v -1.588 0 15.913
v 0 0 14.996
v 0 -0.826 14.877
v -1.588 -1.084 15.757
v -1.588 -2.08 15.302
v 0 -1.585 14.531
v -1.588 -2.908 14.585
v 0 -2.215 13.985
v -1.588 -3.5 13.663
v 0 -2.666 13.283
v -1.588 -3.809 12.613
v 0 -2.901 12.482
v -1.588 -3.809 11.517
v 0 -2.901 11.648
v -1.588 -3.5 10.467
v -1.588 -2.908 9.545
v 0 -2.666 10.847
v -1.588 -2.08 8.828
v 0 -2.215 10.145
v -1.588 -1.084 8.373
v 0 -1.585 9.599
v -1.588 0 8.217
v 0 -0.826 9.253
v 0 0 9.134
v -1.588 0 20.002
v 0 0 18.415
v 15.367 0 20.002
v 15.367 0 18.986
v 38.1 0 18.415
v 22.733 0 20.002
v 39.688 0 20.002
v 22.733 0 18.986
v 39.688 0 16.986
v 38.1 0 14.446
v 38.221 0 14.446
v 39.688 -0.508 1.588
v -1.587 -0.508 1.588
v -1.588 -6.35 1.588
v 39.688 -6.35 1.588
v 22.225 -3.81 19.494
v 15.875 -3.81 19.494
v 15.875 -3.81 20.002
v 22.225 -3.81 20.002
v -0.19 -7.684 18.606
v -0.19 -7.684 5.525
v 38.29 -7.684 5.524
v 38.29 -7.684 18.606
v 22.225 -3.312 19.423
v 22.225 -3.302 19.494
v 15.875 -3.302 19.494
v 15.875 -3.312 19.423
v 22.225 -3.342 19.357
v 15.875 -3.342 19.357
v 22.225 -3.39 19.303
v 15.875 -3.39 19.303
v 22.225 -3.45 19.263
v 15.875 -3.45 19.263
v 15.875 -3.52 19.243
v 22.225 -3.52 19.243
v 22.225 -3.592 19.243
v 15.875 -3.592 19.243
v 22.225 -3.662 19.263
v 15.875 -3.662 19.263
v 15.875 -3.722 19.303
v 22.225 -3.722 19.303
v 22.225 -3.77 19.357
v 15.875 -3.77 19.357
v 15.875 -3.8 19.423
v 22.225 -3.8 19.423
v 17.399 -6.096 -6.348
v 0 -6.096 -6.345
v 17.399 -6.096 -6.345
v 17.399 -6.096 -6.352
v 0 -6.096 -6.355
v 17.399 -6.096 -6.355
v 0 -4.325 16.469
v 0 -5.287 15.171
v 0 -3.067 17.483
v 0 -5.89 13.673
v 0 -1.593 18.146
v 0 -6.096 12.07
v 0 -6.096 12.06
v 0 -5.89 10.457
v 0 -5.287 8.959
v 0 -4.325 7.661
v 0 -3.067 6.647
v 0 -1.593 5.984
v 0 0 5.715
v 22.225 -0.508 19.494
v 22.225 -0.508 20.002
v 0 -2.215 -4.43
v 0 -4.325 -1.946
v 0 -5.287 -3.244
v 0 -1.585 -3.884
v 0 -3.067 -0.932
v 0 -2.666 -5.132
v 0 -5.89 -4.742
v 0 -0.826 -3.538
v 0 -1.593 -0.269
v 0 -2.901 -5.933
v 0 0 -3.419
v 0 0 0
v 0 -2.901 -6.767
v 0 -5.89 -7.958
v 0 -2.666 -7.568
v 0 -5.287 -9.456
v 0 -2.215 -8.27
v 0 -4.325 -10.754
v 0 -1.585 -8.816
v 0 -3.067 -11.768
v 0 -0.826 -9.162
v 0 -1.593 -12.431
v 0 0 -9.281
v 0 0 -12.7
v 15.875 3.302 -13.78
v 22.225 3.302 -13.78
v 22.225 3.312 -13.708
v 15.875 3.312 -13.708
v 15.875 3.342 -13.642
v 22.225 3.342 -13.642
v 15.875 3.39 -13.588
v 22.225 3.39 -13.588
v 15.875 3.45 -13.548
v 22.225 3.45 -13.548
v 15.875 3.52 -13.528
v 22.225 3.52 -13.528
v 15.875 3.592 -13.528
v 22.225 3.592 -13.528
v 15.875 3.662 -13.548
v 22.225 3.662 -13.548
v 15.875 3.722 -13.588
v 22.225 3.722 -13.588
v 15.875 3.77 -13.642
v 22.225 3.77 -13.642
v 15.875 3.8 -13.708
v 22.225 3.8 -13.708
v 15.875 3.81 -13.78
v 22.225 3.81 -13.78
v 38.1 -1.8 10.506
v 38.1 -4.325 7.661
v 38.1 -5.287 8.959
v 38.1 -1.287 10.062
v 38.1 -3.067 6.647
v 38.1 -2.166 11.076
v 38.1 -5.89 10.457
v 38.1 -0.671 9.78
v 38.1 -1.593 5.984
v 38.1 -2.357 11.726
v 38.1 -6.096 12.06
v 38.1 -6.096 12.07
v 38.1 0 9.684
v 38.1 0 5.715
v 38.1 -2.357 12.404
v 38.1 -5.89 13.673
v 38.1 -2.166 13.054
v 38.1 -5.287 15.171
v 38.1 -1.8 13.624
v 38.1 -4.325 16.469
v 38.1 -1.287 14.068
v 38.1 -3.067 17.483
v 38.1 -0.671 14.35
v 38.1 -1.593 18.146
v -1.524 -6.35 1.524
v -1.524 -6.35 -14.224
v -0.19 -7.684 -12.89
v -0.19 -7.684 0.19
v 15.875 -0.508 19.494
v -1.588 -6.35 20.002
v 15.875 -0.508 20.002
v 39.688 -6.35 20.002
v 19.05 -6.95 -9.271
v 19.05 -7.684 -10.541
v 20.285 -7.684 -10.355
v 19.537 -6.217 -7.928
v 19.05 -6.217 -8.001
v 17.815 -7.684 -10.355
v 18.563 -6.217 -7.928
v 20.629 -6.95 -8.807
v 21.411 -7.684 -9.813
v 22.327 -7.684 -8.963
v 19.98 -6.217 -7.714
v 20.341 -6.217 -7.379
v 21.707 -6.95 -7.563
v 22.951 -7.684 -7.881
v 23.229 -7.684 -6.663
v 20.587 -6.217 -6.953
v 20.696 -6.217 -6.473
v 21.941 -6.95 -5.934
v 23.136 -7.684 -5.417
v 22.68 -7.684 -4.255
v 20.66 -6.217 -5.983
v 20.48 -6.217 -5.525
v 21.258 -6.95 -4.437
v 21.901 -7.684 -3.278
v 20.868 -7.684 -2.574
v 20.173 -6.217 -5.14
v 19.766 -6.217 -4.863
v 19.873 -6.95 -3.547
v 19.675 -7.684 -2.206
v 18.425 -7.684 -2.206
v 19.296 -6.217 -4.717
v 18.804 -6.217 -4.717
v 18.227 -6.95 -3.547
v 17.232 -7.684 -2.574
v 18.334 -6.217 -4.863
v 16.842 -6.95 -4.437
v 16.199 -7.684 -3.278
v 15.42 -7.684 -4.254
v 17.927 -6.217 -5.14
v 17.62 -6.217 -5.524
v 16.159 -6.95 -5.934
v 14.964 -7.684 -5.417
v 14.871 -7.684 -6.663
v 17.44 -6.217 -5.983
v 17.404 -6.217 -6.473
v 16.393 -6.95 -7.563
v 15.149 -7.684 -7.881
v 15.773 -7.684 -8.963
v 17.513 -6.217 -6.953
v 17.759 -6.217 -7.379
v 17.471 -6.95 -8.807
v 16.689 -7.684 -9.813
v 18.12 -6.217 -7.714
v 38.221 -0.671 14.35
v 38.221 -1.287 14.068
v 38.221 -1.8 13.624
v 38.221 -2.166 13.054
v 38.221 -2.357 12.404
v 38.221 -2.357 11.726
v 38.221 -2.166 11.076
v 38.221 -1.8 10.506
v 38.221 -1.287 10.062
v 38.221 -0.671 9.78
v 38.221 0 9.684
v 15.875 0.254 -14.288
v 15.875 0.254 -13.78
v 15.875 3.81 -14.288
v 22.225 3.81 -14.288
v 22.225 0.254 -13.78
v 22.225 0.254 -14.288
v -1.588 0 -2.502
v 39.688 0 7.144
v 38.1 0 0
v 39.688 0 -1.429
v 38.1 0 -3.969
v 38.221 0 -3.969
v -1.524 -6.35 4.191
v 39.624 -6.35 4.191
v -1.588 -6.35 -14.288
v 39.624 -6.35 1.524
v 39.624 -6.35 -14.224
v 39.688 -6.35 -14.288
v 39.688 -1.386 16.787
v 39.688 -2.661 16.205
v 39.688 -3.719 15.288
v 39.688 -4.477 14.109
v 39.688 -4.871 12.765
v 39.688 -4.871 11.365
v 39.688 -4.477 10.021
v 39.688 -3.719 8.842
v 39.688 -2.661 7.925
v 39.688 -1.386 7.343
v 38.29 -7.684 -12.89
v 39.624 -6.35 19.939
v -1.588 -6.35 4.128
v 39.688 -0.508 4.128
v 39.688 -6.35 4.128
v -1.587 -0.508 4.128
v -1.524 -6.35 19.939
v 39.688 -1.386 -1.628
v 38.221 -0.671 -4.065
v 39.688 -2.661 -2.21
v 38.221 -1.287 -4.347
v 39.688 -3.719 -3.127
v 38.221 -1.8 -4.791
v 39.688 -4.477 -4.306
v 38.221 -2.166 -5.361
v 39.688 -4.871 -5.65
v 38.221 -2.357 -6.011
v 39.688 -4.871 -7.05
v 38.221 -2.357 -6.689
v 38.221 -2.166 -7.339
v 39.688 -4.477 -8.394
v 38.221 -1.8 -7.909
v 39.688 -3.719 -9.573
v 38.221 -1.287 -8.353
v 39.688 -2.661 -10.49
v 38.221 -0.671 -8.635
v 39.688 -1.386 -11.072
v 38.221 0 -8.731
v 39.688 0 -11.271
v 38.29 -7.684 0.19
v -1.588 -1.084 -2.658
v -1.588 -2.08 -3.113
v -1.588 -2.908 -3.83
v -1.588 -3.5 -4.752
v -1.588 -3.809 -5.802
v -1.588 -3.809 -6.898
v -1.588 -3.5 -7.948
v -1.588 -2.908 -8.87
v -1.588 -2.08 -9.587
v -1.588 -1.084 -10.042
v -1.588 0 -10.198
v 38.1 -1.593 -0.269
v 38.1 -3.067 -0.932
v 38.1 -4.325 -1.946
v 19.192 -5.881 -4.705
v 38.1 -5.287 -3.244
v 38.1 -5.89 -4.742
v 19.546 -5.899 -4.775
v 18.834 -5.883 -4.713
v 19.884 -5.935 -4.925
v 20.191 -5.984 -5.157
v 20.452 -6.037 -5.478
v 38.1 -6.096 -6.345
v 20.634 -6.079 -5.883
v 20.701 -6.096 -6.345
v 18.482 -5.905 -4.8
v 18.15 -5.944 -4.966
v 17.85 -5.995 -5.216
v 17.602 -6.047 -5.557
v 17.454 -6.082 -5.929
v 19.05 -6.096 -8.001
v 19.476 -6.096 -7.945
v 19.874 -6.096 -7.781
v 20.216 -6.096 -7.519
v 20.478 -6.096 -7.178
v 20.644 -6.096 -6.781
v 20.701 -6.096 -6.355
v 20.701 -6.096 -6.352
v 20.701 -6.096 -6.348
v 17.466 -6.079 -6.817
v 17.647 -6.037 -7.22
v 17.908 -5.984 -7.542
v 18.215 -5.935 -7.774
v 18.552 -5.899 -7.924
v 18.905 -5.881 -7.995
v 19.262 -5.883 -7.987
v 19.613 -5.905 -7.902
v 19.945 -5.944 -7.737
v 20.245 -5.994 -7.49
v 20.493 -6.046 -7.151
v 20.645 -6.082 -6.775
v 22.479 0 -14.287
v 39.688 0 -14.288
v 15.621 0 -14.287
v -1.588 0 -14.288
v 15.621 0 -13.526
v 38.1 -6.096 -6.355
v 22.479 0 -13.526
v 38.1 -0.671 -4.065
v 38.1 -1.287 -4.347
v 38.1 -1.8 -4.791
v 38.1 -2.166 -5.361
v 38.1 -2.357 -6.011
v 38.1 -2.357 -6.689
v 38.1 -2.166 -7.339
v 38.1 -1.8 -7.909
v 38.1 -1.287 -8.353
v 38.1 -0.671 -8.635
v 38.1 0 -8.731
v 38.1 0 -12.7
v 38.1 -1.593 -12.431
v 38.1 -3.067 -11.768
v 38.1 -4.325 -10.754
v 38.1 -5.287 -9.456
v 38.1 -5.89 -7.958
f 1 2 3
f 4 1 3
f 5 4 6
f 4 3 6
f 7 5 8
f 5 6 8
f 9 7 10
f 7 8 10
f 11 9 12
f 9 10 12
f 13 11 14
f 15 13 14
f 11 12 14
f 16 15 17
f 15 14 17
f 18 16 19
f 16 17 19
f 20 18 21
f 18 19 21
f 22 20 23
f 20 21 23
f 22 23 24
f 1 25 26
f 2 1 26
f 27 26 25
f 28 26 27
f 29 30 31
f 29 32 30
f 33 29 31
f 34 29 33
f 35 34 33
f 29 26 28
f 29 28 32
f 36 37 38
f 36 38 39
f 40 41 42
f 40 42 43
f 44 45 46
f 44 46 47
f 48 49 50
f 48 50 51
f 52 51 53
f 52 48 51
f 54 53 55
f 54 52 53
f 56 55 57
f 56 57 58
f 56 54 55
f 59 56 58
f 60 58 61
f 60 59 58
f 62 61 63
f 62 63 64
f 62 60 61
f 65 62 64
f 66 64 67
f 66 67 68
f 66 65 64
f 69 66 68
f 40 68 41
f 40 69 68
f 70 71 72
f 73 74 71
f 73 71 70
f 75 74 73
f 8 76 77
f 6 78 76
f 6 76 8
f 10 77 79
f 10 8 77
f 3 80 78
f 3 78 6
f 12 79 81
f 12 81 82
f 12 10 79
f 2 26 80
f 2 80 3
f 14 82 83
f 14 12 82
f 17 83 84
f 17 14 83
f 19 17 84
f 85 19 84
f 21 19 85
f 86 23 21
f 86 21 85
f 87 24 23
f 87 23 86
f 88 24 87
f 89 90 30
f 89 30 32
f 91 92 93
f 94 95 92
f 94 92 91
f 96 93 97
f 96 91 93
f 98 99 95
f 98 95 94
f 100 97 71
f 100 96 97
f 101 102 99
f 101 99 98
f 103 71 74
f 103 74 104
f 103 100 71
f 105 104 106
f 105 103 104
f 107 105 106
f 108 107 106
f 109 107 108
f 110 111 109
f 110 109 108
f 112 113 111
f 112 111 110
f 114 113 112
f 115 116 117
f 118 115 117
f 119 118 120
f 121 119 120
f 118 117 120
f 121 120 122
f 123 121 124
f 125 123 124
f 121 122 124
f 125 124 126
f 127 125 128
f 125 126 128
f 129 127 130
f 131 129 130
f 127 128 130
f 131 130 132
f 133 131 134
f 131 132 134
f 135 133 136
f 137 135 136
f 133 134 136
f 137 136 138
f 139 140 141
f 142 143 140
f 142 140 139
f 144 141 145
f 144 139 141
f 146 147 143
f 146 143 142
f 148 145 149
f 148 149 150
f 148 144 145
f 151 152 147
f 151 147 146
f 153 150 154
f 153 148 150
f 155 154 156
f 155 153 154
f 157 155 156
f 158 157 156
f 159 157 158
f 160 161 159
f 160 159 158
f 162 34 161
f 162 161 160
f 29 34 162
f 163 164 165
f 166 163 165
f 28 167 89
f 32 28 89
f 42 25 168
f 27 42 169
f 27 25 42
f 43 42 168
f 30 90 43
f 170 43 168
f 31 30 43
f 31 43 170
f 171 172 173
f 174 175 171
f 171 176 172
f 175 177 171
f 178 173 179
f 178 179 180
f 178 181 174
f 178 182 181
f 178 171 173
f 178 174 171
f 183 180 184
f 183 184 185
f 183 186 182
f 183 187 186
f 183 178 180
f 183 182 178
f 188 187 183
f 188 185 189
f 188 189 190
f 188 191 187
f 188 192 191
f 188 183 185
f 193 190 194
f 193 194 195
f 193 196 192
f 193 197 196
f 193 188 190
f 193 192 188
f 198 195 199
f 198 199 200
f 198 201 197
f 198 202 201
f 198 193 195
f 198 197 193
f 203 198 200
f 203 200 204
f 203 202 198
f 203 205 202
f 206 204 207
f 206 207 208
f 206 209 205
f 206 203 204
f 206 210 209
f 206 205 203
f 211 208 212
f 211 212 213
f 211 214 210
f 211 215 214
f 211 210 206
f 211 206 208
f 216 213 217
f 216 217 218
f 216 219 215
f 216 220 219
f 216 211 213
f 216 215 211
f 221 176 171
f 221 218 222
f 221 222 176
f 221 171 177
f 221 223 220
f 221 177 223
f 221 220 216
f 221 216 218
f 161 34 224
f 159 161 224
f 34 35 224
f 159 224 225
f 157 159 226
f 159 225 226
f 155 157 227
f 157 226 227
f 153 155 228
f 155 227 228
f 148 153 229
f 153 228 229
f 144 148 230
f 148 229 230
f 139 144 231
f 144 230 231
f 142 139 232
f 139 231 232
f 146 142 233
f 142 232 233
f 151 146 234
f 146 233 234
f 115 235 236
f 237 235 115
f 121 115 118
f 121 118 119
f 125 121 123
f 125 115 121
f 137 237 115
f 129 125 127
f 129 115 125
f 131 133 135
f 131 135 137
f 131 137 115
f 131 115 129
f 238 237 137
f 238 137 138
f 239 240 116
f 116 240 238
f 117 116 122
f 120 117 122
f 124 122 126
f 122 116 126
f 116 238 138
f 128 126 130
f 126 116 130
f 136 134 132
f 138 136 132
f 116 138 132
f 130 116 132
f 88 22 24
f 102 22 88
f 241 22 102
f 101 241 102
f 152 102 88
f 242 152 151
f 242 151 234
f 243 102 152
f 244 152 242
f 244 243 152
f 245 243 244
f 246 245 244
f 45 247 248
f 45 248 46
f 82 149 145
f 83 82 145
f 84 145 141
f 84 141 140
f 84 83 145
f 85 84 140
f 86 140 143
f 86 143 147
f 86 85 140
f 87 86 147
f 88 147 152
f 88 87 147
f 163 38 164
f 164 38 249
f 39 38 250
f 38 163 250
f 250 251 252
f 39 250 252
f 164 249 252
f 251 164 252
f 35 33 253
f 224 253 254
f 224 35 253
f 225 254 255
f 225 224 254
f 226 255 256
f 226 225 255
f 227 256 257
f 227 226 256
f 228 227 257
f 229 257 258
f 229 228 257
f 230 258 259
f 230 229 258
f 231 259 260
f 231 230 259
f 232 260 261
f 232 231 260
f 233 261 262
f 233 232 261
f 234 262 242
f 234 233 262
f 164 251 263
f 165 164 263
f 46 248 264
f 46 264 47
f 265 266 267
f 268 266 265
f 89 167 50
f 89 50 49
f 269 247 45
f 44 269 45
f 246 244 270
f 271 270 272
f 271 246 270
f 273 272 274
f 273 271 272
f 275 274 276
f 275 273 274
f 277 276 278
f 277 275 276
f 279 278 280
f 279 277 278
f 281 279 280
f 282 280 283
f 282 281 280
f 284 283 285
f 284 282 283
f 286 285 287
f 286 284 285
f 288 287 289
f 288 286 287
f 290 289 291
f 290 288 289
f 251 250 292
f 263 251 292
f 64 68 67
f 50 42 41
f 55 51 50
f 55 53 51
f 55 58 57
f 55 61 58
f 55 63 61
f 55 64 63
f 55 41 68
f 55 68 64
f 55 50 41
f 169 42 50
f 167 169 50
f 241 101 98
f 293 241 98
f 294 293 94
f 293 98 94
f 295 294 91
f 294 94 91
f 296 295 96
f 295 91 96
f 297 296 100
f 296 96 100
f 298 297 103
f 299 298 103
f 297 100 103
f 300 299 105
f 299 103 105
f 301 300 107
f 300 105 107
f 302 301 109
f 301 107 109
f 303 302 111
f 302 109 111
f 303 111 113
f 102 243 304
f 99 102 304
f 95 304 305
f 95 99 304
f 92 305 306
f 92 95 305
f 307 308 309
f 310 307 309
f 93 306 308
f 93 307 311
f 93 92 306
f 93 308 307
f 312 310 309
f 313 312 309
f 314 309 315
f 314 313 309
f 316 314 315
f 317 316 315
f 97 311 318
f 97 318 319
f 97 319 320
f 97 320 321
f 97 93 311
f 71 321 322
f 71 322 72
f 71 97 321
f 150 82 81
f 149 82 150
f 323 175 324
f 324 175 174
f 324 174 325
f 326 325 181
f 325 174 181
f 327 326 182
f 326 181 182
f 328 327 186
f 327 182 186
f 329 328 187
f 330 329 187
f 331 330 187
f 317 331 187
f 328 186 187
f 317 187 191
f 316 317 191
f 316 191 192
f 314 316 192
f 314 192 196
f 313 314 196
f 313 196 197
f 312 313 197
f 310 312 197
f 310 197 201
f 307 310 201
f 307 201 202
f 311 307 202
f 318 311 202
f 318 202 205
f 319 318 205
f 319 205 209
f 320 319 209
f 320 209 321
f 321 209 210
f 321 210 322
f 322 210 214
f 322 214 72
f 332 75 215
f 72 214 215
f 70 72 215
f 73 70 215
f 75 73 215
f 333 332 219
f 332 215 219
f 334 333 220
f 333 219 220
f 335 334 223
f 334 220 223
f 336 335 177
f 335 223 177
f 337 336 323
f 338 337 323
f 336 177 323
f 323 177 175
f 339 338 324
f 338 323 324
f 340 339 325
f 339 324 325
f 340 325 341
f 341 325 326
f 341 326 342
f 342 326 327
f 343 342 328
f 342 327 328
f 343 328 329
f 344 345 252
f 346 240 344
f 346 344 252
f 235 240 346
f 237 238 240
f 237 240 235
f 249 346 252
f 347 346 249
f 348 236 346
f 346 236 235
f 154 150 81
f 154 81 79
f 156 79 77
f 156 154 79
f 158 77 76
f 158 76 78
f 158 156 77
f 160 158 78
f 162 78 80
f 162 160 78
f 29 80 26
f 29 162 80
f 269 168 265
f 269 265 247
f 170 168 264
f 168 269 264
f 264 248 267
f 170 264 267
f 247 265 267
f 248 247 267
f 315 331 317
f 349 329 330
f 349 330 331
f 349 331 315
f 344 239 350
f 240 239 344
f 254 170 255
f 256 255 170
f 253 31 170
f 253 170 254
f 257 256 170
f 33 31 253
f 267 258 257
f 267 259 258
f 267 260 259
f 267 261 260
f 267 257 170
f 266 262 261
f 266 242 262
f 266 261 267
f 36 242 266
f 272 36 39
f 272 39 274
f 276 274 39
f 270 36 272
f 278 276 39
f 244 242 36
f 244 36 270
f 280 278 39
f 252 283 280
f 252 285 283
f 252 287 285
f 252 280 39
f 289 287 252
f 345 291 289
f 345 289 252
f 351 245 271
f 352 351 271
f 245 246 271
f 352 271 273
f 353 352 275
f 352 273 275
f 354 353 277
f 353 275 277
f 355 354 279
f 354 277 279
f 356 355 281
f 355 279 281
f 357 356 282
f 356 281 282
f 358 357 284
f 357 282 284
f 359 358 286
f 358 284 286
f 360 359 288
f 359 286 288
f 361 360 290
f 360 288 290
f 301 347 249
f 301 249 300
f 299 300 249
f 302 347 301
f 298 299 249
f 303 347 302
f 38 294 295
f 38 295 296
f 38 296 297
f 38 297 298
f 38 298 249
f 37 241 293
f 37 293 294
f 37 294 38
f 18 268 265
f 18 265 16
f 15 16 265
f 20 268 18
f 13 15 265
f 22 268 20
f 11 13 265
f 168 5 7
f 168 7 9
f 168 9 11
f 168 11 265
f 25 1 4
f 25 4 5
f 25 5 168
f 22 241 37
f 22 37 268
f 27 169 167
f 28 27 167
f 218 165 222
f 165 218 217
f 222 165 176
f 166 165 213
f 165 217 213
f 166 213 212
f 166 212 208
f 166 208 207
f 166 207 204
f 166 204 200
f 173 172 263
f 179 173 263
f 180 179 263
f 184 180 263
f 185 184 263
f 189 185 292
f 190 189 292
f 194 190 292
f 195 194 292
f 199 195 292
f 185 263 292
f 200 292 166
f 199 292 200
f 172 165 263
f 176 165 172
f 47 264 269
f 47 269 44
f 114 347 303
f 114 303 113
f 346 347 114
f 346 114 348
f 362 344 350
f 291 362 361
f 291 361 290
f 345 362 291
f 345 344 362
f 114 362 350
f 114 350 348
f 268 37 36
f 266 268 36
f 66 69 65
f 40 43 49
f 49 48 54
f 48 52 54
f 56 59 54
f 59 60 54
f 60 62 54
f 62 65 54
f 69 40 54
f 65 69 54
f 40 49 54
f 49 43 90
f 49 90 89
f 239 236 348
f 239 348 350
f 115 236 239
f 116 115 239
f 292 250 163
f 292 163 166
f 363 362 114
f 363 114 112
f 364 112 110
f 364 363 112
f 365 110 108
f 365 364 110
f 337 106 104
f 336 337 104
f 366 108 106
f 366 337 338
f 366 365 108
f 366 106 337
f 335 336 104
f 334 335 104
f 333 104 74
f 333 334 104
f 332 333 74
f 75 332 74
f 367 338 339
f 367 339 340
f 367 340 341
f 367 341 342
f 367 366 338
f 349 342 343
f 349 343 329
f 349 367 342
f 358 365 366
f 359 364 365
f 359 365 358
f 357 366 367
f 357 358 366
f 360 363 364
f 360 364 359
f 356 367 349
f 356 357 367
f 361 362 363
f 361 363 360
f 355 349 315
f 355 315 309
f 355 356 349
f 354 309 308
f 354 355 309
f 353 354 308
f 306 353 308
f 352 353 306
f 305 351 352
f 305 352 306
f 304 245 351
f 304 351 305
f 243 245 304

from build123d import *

# Parameters (mm, degrees)
BOSS_EXTRUDE1_DEPTH  = 6.35
BOSS_EXTRUDE2_START  = -6.096
SKETCH1_3_W          = 38.1
SKETCH1_3_H          = 12.7
BOSS_EXTRUDE2_DEPTH  = 1.5875
SKETCH1_5_W          = 41.275
SKETCH1_5_H          = 1.27
BOSS_EXTRUDE4_DEPTH  = 0.508
CHAMFER2_SIZE        = 1.524
SKETCH5_R            = 2.38125
CUT_EXTRUDE1_DEPTH   = 47.505502938
CHAMFER3_SIZE        = 1.466469684
CHAMFER3_SIZE_2      = 2.54
SKETCH6_W            = 6.35
SKETCH6_H            = 0.508
BOSS_EXTRUDE7_DEPTH  = 3.81
BOSS_EXTRUDE10_DEPTH = 6.35
SKETCH6_5_W          = 6.35
SKETCH6_5_H          = 0.508
CUT_EXTRUDE2_DEPTH   = 3.81
CUT_EXTRUDE3_DEPTH   = 6.35
CHAMFER4_SIZE        = 0.508
CHAMFER5_SIZE        = 0.254
SKETCH10_R           = 1.651
CUT_EXTRUDE4_DEPTH   = 46.905317826
CHAMFER6_SIZE        = 2.54
CHAMFER6_SIZE2       = 1.466469684
FILLET1_R            = 6.35


with BuildPart() as part:
    # Sketch1 → Boss-Extrude1 (new body)
    with BuildSketch(Plane(origin=(0, 0, 0), x_dir=(1, 0, 0), z_dir=(0, 1, 0))):
        Polygon((-1.5875, 6.35), (-1.5875, -1.5875), (39.6875, -1.5875), (39.6875, 6.35), (38.1, 6.35), (38.1, 0), (0, 0), (0, 6.35), align=None)
        Polygon((39.6875, -4.1275), (-1.5875, -4.1275), (-1.5875, -12.065), (0, -12.065), (0, -5.715), (38.1, -5.715), (38.1, -12.065), (39.6875, -12.065), align=None)
        Polygon((0, -12.065), (-1.5875, -12.065), (-1.5875, -20.0025), (39.6875, -20.0025), (39.6875, -12.065), (38.1, -12.065), (38.1, -18.415), (0, -18.415), align=None)
        Polygon((-1.5875, 14.2875), (-1.5875, 6.35), (0, 6.35), (0, 12.7), (38.1, 12.7), (38.1, 6.35), (39.6875, 6.35), (39.6875, 14.2875), align=None)
    extrude(amount=-BOSS_EXTRUDE1_DEPTH)

    # Sketch1<3> → Boss-Extrude2 (add)
    with BuildSketch(Plane(origin=(0, 0, 0), x_dir=(1, 0, 0), z_dir=(0, 1, 0)).offset(BOSS_EXTRUDE2_START)):
        with Locations((19.05, -12.065)):
            Rectangle(SKETCH1_3_W, SKETCH1_3_H)
        with Locations((19.05, 6.35)):
            Rectangle(SKETCH1_3_W, SKETCH1_3_H)
    extrude(amount=-BOSS_EXTRUDE2_DEPTH)

    # Sketch1<5> → Boss-Extrude4 (add)
    with BuildSketch(Plane(origin=(0, 0, 0), x_dir=(1, 0, 0), z_dir=(0, 1, 0))):
        with Locations((19.05, -2.2225)):
            Rectangle(SKETCH1_5_W, SKETCH1_5_H)
        with Locations((19.05, -3.4925)):
            Rectangle(SKETCH1_5_W, SKETCH1_5_H)
    extrude(amount=-BOSS_EXTRUDE4_DEPTH)

    # Chamfer2
    # the kernel refuses this chamfer: 1.524 mm, written as the material it adds along each edge
    with BuildSketch(Plane(origin=(38.1, -6.35, 18.415), x_dir=(0, 0, 1), z_dir=(-1, 0, 0))) as chamfer2_piece_1_section:
        Polygon((CHAMFER2_SIZE, 0), (0, -CHAMFER2_SIZE), (0, 0), align=None)
    chamfer2_piece_1 = extrude(amount=38.1, mode=Mode.PRIVATE)
    chamfer2_piece_1 = split(chamfer2_piece_1, bisect_by=Plane(origin=(38.1, -7.6835, 18.415), z_dir=(0, 1, 0)), keep=Keep.TOP, mode=Mode.PRIVATE)
    add(chamfer2_piece_1)
    with BuildSketch(Plane(origin=(0, -6.35, 5.715), x_dir=(-1, 0, 0), z_dir=(0, 0, 1))) as chamfer2_piece_2_section:
        Polygon((CHAMFER2_SIZE, 0), (0, CHAMFER2_SIZE), (0, 0), align=None)
    chamfer2_piece_2 = extrude(amount=12.7, mode=Mode.PRIVATE)
    chamfer2_piece_2 = split(chamfer2_piece_2, bisect_by=Plane(origin=(0, -7.6835, 5.715), z_dir=(0, 1, 0)), keep=Keep.TOP, mode=Mode.PRIVATE)
    add(chamfer2_piece_2)
    with BuildSketch(Plane(origin=(38.1, -6.35, 18.415), x_dir=(1, 0, 0), z_dir=(0, 0, -1))) as chamfer2_piece_3_section:
        Polygon((CHAMFER2_SIZE, 0), (0, CHAMFER2_SIZE), (0, 0), align=None)
    chamfer2_piece_3 = extrude(amount=12.7, mode=Mode.PRIVATE)
    chamfer2_piece_3 = split(chamfer2_piece_3, bisect_by=Plane(origin=(38.1, -7.6835, 18.415), z_dir=(0, 1, 0)), keep=Keep.TOP, mode=Mode.PRIVATE)
    add(chamfer2_piece_3)
    with BuildSketch(Plane(origin=(0, -6.35, 5.715), x_dir=(0, 0, -1), z_dir=(1, 0, 0))) as chamfer2_piece_4_section:
        Polygon((CHAMFER2_SIZE, 0), (0, -CHAMFER2_SIZE), (0, 0), align=None)
    chamfer2_piece_4 = extrude(amount=38.1, mode=Mode.PRIVATE)
    chamfer2_piece_4 = split(chamfer2_piece_4, bisect_by=Plane(origin=(0, -7.6835, 5.715), z_dir=(0, 1, 0)), keep=Keep.TOP, mode=Mode.PRIVATE)
    add(chamfer2_piece_4)
    with BuildSketch(Plane(origin=(38.1, -6.35, 0), x_dir=(0, 0, 1), z_dir=(-1, 0, 0))) as chamfer2_piece_5_section:
        Polygon((CHAMFER2_SIZE, 0), (0, -CHAMFER2_SIZE), (0, 0), align=None)
    chamfer2_piece_5 = extrude(amount=38.1, mode=Mode.PRIVATE)
    chamfer2_piece_5 = split(chamfer2_piece_5, bisect_by=Plane(origin=(38.1, -7.6835, 0), z_dir=(0, 1, 0)), keep=Keep.TOP, mode=Mode.PRIVATE)
    add(chamfer2_piece_5)
    with BuildSketch(Plane(origin=(38.1, -6.35, 0), x_dir=(1, 0, 0), z_dir=(0, 0, -1))) as chamfer2_piece_6_section:
        Polygon((CHAMFER2_SIZE, 0), (0, CHAMFER2_SIZE), (0, 0), align=None)
    chamfer2_piece_6 = extrude(amount=12.7, mode=Mode.PRIVATE)
    chamfer2_piece_6 = split(chamfer2_piece_6, bisect_by=Plane(origin=(38.1, -7.6835, 0), z_dir=(0, 1, 0)), keep=Keep.TOP, mode=Mode.PRIVATE)
    add(chamfer2_piece_6)
    with BuildSketch(Plane(origin=(0, -6.35, -12.7), x_dir=(-1, 0, 0), z_dir=(0, 0, 1))) as chamfer2_piece_7_section:
        Polygon((CHAMFER2_SIZE, 0), (0, CHAMFER2_SIZE), (0, 0), align=None)
    chamfer2_piece_7 = extrude(amount=12.7, mode=Mode.PRIVATE)
    chamfer2_piece_7 = split(chamfer2_piece_7, bisect_by=Plane(origin=(0, -7.6835, -12.7), z_dir=(0, 1, 0)), keep=Keep.TOP, mode=Mode.PRIVATE)
    add(chamfer2_piece_7)
    with BuildSketch(Plane(origin=(0, -6.35, -12.7), x_dir=(0, 0, -1), z_dir=(1, 0, 0))) as chamfer2_piece_8_section:
        Polygon((CHAMFER2_SIZE, 0), (0, -CHAMFER2_SIZE), (0, 0), align=None)
    chamfer2_piece_8 = extrude(amount=38.1, mode=Mode.PRIVATE)
    chamfer2_piece_8 = split(chamfer2_piece_8, bisect_by=Plane(origin=(0, -7.6835, -12.7), z_dir=(0, 1, 0)), keep=Keep.TOP, mode=Mode.PRIVATE)
    add(chamfer2_piece_8)
    with BuildSketch(Plane(origin=(38.1, -6.35, 22.334244874), x_dir=(1, 0, 0), z_dir=(0, 0, -1))) as chamfer2_piece_9a_section:
        Polygon((CHAMFER2_SIZE, 0), (0, CHAMFER2_SIZE), (0, 0), align=None)
    chamfer2_piece_9a = extrude(amount=16.619244874, mode=Mode.PRIVATE)
    chamfer2_piece_9a = split(chamfer2_piece_9a, bisect_by=Plane(origin=(38.1, -6.35, 20.0025), z_dir=(0, 0, -1)), keep=Keep.TOP, mode=Mode.PRIVATE)
    chamfer2_piece_9a = split(chamfer2_piece_9a, bisect_by=Plane(origin=(38.1, -6.35, 18.415), z_dir=(0, 0, 1)), keep=Keep.TOP, mode=Mode.PRIVATE)
    chamfer2_piece_9a = split(chamfer2_piece_9a, bisect_by=Plane(origin=(38.1, -7.6835, 22.334244874), z_dir=(0, 1, 0)), keep=Keep.TOP, mode=Mode.PRIVATE)
    with BuildSketch(Plane(origin=(42.019244874, -6.35, 18.415), x_dir=(0, 0, 1), z_dir=(-1, 0, 0))) as chamfer2_piece_9b_section:
        Polygon((CHAMFER2_SIZE, 0), (0, -CHAMFER2_SIZE), (0, 0), align=None)
    chamfer2_piece_9b = extrude(amount=42.019244874, mode=Mode.PRIVATE)
    chamfer2_piece_9b = split(chamfer2_piece_9b, bisect_by=Plane(origin=(39.6875, -6.35, 18.415), z_dir=(-1, 0, 0)), keep=Keep.TOP, mode=Mode.PRIVATE)
    chamfer2_piece_9b = split(chamfer2_piece_9b, bisect_by=Plane(origin=(42.019244874, -7.6835, 18.415), z_dir=(0, 1, 0)), keep=Keep.TOP, mode=Mode.PRIVATE)
    chamfer2_piece_9b = split(chamfer2_piece_9b, bisect_by=Plane(origin=(38.1, -6.35, 18.415), z_dir=(1, 0, 0)), keep=Keep.TOP, mode=Mode.PRIVATE)
    chamfer2_piece_9 = chamfer2_piece_9a & chamfer2_piece_9b
    add(chamfer2_piece_9)
    with BuildSketch(Plane(origin=(0, -6.35, 5.715), x_dir=(-1, 0, 0), z_dir=(0, 0, 1))) as chamfer2_piece_10a_section:
        Polygon((CHAMFER2_SIZE, 0), (0, CHAMFER2_SIZE), (0, 0), align=None)
    chamfer2_piece_10a = extrude(amount=16.619244874, mode=Mode.PRIVATE)
    chamfer2_piece_10a = split(chamfer2_piece_10a, bisect_by=Plane(origin=(0, -6.35, 20.0025), z_dir=(0, 0, -1)), keep=Keep.TOP, mode=Mode.PRIVATE)
    chamfer2_piece_10a = split(chamfer2_piece_10a, bisect_by=Plane(origin=(0, -6.35, 18.415), z_dir=(0, 0, 1)), keep=Keep.TOP, mode=Mode.PRIVATE)
    chamfer2_piece_10a = split(chamfer2_piece_10a, bisect_by=Plane(origin=(0, -7.6835, 5.715), z_dir=(0, 1, 0)), keep=Keep.TOP, mode=Mode.PRIVATE)
    with BuildSketch(Plane(origin=(38.1, -6.35, 18.415), x_dir=(0, 0, 1), z_dir=(-1, 0, 0))) as chamfer2_piece_10b_section:
        Polygon((CHAMFER2_SIZE, 0), (0, -CHAMFER2_SIZE), (0, 0), align=None)
    chamfer2_piece_10b = extrude(amount=42.019244874, mode=Mode.PRIVATE)
    chamfer2_piece_10b = split(chamfer2_piece_10b, bisect_by=Plane(origin=(-1.5875, -6.35, 18.415), z_dir=(1, 0, 0)), keep=Keep.TOP, mode=Mode.PRIVATE)
    chamfer2_piece_10b = split(chamfer2_piece_10b, bisect_by=Plane(origin=(0, -6.35, 18.415), z_dir=(-1, 0, 0)), keep=Keep.TOP, mode=Mode.PRIVATE)
    chamfer2_piece_10b = split(chamfer2_piece_10b, bisect_by=Plane(origin=(38.1, -7.6835, 18.415), z_dir=(0, 1, 0)), keep=Keep.TOP, mode=Mode.PRIVATE)
    chamfer2_piece_10 = chamfer2_piece_10a & chamfer2_piece_10b
    add(chamfer2_piece_10)
    with BuildSketch(Plane(origin=(0, -6.35, 1.795755126), x_dir=(-1, 0, 0), z_dir=(0, 0, 1))) as chamfer2_piece_11a_section:
        Polygon((CHAMFER2_SIZE, 0), (0, CHAMFER2_SIZE), (0, 0), align=None)
    chamfer2_piece_11a = extrude(amount=16.619244874, mode=Mode.PRIVATE)
    chamfer2_piece_11a = split(chamfer2_piece_11a, bisect_by=Plane(origin=(0, -6.35, 4.1275), z_dir=(0, 0, 1)), keep=Keep.TOP, mode=Mode.PRIVATE)
    chamfer2_piece_11a = split(chamfer2_piece_11a, bisect_by=Plane(origin=(0, -7.6835, 1.795755126), z_dir=(0, 1, 0)), keep=Keep.TOP, mode=Mode.PRIVATE)
    chamfer2_piece_11a = split(chamfer2_piece_11a, bisect_by=Plane(origin=(0, -6.35, 5.715), z_dir=(0, 0, -1)), keep=Keep.TOP, mode=Mode.PRIVATE)
    with BuildSketch(Plane(origin=(-3.919244874, -6.35, 5.715), x_dir=(0, 0, -1), z_dir=(1, 0, 0))) as chamfer2_piece_11b_section:
        Polygon((CHAMFER2_SIZE, 0), (0, -CHAMFER2_SIZE), (0, 0), align=None)
    chamfer2_piece_11b = extrude(amount=42.019244874, mode=Mode.PRIVATE)
    chamfer2_piece_11b = split(chamfer2_piece_11b, bisect_by=Plane(origin=(-1.5875, -6.35, 5.715), z_dir=(1, 0, 0)), keep=Keep.TOP, mode=Mode.PRIVATE)
    chamfer2_piece_11b = split(chamfer2_piece_11b, bisect_by=Plane(origin=(-3.919244874, -7.6835, 5.715), z_dir=(0, 1, 0)), keep=Keep.TOP, mode=Mode.PRIVATE)
    chamfer2_piece_11b = split(chamfer2_piece_11b, bisect_by=Plane(origin=(0, -6.35, 5.715), z_dir=(-1, 0, 0)), keep=Keep.TOP, mode=Mode.PRIVATE)
    chamfer2_piece_11 = chamfer2_piece_11a & chamfer2_piece_11b
    add(chamfer2_piece_11)
    with BuildSketch(Plane(origin=(0, -6.35, 5.715), x_dir=(0, 0, -1), z_dir=(1, 0, 0))) as chamfer2_piece_12a_section:
        Polygon((CHAMFER2_SIZE, 0), (0, -CHAMFER2_SIZE), (0, 0), align=None)
    chamfer2_piece_12a = extrude(amount=42.019244874, mode=Mode.PRIVATE)
    chamfer2_piece_12a = split(chamfer2_piece_12a, bisect_by=Plane(origin=(39.6875, -6.35, 5.715), z_dir=(-1, 0, 0)), keep=Keep.TOP, mode=Mode.PRIVATE)
    chamfer2_piece_12a = split(chamfer2_piece_12a, bisect_by=Plane(origin=(0, -7.6835, 5.715), z_dir=(0, 1, 0)), keep=Keep.TOP, mode=Mode.PRIVATE)
    chamfer2_piece_12a = split(chamfer2_piece_12a, bisect_by=Plane(origin=(38.1, -6.35, 5.715), z_dir=(1, 0, 0)), keep=Keep.TOP, mode=Mode.PRIVATE)
    with BuildSketch(Plane(origin=(38.1, -6.35, 18.415), x_dir=(1, 0, 0), z_dir=(0, 0, -1))) as chamfer2_piece_12b_section:
        Polygon((CHAMFER2_SIZE, 0), (0, CHAMFER2_SIZE), (0, 0), align=None)
    chamfer2_piece_12b = extrude(amount=16.619244874, mode=Mode.PRIVATE)
    chamfer2_piece_12b = split(chamfer2_piece_12b, bisect_by=Plane(origin=(38.1, -6.35, 4.1275), z_dir=(0, 0, 1)), keep=Keep.TOP, mode=Mode.PRIVATE)
    chamfer2_piece_12b = split(chamfer2_piece_12b, bisect_by=Plane(origin=(38.1, -7.6835, 18.415), z_dir=(0, 1, 0)), keep=Keep.TOP, mode=Mode.PRIVATE)
    chamfer2_piece_12b = split(chamfer2_piece_12b, bisect_by=Plane(origin=(38.1, -6.35, 5.715), z_dir=(0, 0, -1)), keep=Keep.TOP, mode=Mode.PRIVATE)
    chamfer2_piece_12 = chamfer2_piece_12a & chamfer2_piece_12b
    add(chamfer2_piece_12)
    with BuildSketch(Plane(origin=(38.1, -6.35, 3.919244874), x_dir=(1, 0, 0), z_dir=(0, 0, -1))) as chamfer2_piece_13a_section:
        Polygon((CHAMFER2_SIZE, 0), (0, CHAMFER2_SIZE), (0, 0), align=None)
    chamfer2_piece_13a = extrude(amount=16.619244874, mode=Mode.PRIVATE)
    chamfer2_piece_13a = split(chamfer2_piece_13a, bisect_by=Plane(origin=(38.1, -6.35, 1.5875), z_dir=(0, 0, -1)), keep=Keep.TOP, mode=Mode.PRIVATE)
    chamfer2_piece_13a = split(chamfer2_piece_13a, bisect_by=Plane(origin=(38.1, -7.6835, 3.919244874), z_dir=(0, 1, 0)), keep=Keep.TOP, mode=Mode.PRIVATE)
    chamfer2_piece_13a = split(chamfer2_piece_13a, bisect_by=Plane(origin=(38.1, -6.35, 0), z_dir=(0, 0, 1)), keep=Keep.TOP, mode=Mode.PRIVATE)
    with BuildSketch(Plane(origin=(42.019244874, -6.35, 0), x_dir=(0, 0, 1), z_dir=(-1, 0, 0))) as chamfer2_piece_13b_section:
        Polygon((CHAMFER2_SIZE, 0), (0, -CHAMFER2_SIZE), (0, 0), align=None)
    chamfer2_piece_13b = extrude(amount=42.019244874, mode=Mode.PRIVATE)
    chamfer2_piece_13b = split(chamfer2_piece_13b, bisect_by=Plane(origin=(39.6875, -6.35, 0), z_dir=(-1, 0, 0)), keep=Keep.TOP, mode=Mode.PRIVATE)
    chamfer2_piece_13b = split(chamfer2_piece_13b, bisect_by=Plane(origin=(42.019244874, -7.6835, 0), z_dir=(0, 1, 0)), keep=Keep.TOP, mode=Mode.PRIVATE)
    chamfer2_piece_13b = split(chamfer2_piece_13b, bisect_by=Plane(origin=(38.1, -6.35, 0), z_dir=(1, 0, 0)), keep=Keep.TOP, mode=Mode.PRIVATE)
    chamfer2_piece_13 = chamfer2_piece_13a & chamfer2_piece_13b
    add(chamfer2_piece_13)
    with BuildSketch(Plane(origin=(38.1, -6.35, 0), x_dir=(0, 0, 1), z_dir=(-1, 0, 0))) as chamfer2_piece_14a_section:
        Polygon((CHAMFER2_SIZE, 0), (0, -CHAMFER2_SIZE), (0, 0), align=None)
    chamfer2_piece_14a = extrude(amount=42.019244874, mode=Mode.PRIVATE)
    chamfer2_piece_14a = split(chamfer2_piece_14a, bisect_by=Plane(origin=(-1.5875, -6.35, 0), z_dir=(1, 0, 0)), keep=Keep.TOP, mode=Mode.PRIVATE)
    chamfer2_piece_14a = split(chamfer2_piece_14a, bisect_by=Plane(origin=(38.1, -7.6835, 0), z_dir=(0, 1, 0)), keep=Keep.TOP, mode=Mode.PRIVATE)
    chamfer2_piece_14a = split(chamfer2_piece_14a, bisect_by=Plane(origin=(0, -6.35, 0), z_dir=(-1, 0, 0)), keep=Keep.TOP, mode=Mode.PRIVATE)
    with BuildSketch(Plane(origin=(0, -6.35, -12.7), x_dir=(-1, 0, 0), z_dir=(0, 0, 1))) as chamfer2_piece_14b_section:
        Polygon((CHAMFER2_SIZE, 0), (0, CHAMFER2_SIZE), (0, 0), align=None)
    chamfer2_piece_14b = extrude(amount=16.619244874, mode=Mode.PRIVATE)
    chamfer2_piece_14b = split(chamfer2_piece_14b, bisect_by=Plane(origin=(0, -6.35, 1.5875), z_dir=(0, 0, -1)), keep=Keep.TOP, mode=Mode.PRIVATE)
    chamfer2_piece_14b = split(chamfer2_piece_14b, bisect_by=Plane(origin=(0, -7.6835, -12.7), z_dir=(0, 1, 0)), keep=Keep.TOP, mode=Mode.PRIVATE)
    chamfer2_piece_14b = split(chamfer2_piece_14b, bisect_by=Plane(origin=(0, -6.35, 0), z_dir=(0, 0, 1)), keep=Keep.TOP, mode=Mode.PRIVATE)
    chamfer2_piece_14 = chamfer2_piece_14a & chamfer2_piece_14b
    add(chamfer2_piece_14)
    with BuildSketch(Plane(origin=(38.1, -6.35, 0), x_dir=(1, 0, 0), z_dir=(0, 0, -1))) as chamfer2_piece_15a_section:
        Polygon((CHAMFER2_SIZE, 0), (0, CHAMFER2_SIZE), (0, 0), align=None)
    chamfer2_piece_15a = extrude(amount=16.619244874, mode=Mode.PRIVATE)
    chamfer2_piece_15a = split(chamfer2_piece_15a, bisect_by=Plane(origin=(38.1, -6.35, -14.2875), z_dir=(0, 0, 1)), keep=Keep.TOP, mode=Mode.PRIVATE)
    chamfer2_piece_15a = split(chamfer2_piece_15a, bisect_by=Plane(origin=(38.1, -6.35, -12.7), z_dir=(0, 0, -1)), keep=Keep.TOP, mode=Mode.PRIVATE)
    chamfer2_piece_15a = split(chamfer2_piece_15a, bisect_by=Plane(origin=(38.1, -7.6835, 0), z_dir=(0, 1, 0)), keep=Keep.TOP, mode=Mode.PRIVATE)
    with BuildSketch(Plane(origin=(0, -6.35, -12.7), x_dir=(0, 0, -1), z_dir=(1, 0, 0))) as chamfer2_piece_15b_section:
        Polygon((CHAMFER2_SIZE, 0), (0, -CHAMFER2_SIZE), (0, 0), align=None)
    chamfer2_piece_15b = extrude(amount=42.019244874, mode=Mode.PRIVATE)
    chamfer2_piece_15b = split(chamfer2_piece_15b, bisect_by=Plane(origin=(39.6875, -6.35, -12.7), z_dir=(-1, 0, 0)), keep=Keep.TOP, mode=Mode.PRIVATE)
    chamfer2_piece_15b = split(chamfer2_piece_15b, bisect_by=Plane(origin=(0, -7.6835, -12.7), z_dir=(0, 1, 0)), keep=Keep.TOP, mode=Mode.PRIVATE)
    chamfer2_piece_15b = split(chamfer2_piece_15b, bisect_by=Plane(origin=(38.1, -6.35, -12.7), z_dir=(1, 0, 0)), keep=Keep.TOP, mode=Mode.PRIVATE)
    chamfer2_piece_15 = chamfer2_piece_15a & chamfer2_piece_15b
    add(chamfer2_piece_15)
    with BuildSketch(Plane(origin=(0, -6.35, -16.619244874), x_dir=(-1, 0, 0), z_dir=(0, 0, 1))) as chamfer2_piece_16a_section:
        Polygon((CHAMFER2_SIZE, 0), (0, CHAMFER2_SIZE), (0, 0), align=None)
    chamfer2_piece_16a = extrude(amount=16.619244874, mode=Mode.PRIVATE)
    chamfer2_piece_16a = split(chamfer2_piece_16a, bisect_by=Plane(origin=(0, -6.35, -14.2875), z_dir=(0, 0, 1)), keep=Keep.TOP, mode=Mode.PRIVATE)
    chamfer2_piece_16a = split(chamfer2_piece_16a, bisect_by=Plane(origin=(0, -6.35, -12.7), z_dir=(0, 0, -1)), keep=Keep.TOP, mode=Mode.PRIVATE)
    chamfer2_piece_16a = split(chamfer2_piece_16a, bisect_by=Plane(origin=(0, -7.6835, -16.619244874), z_dir=(0, 1, 0)), keep=Keep.TOP, mode=Mode.PRIVATE)
    with BuildSketch(Plane(origin=(-3.919244874, -6.35, -12.7), x_dir=(0, 0, -1), z_dir=(1, 0, 0))) as chamfer2_piece_16b_section:
        Polygon((CHAMFER2_SIZE, 0), (0, -CHAMFER2_SIZE), (0, 0), align=None)
    chamfer2_piece_16b = extrude(amount=42.019244874, mode=Mode.PRIVATE)
    chamfer2_piece_16b = split(chamfer2_piece_16b, bisect_by=Plane(origin=(-1.5875, -6.35, -12.7), z_dir=(1, 0, 0)), keep=Keep.TOP, mode=Mode.PRIVATE)
    chamfer2_piece_16b = split(chamfer2_piece_16b, bisect_by=Plane(origin=(0, -6.35, -12.7), z_dir=(-1, 0, 0)), keep=Keep.TOP, mode=Mode.PRIVATE)
    chamfer2_piece_16b = split(chamfer2_piece_16b, bisect_by=Plane(origin=(-3.919244874, -7.6835, -12.7), z_dir=(0, 1, 0)), keep=Keep.TOP, mode=Mode.PRIVATE)
    chamfer2_piece_16 = chamfer2_piece_16a & chamfer2_piece_16b
    add(chamfer2_piece_16)

    # Sketch5 → Cut-Extrude1 (cut, through all)
    with BuildSketch(Plane(origin=(39.6875, 0, 0), x_dir=(0, 0, -1), z_dir=(1, 0, 0))):
        with Locations((-12.065, 0)):
            Circle(SKETCH5_R)
        with Locations((6.35, 0)):
            Circle(SKETCH5_R)
    extrude(amount=-CUT_EXTRUDE1_DEPTH, mode=Mode.SUBTRACT)

    # Chamfer3
    # the kernel refuses this chamfer: 2.54, 1.466469684 mm, written as the material it takes off along each edge
    with BuildSketch(Plane(origin=(-1.5875, 0, 12.065), x_dir=(0, 0.9999950652018582, 0.0031415874858796654), z_dir=(0, 0.0031415874858796654, -0.9999950652018582))) as chamfer3_piece_1:
        Polygon((2.38125 + CHAMFER3_SIZE, 0), (2.38125, CHAMFER3_SIZE_2), (2.38125, 0), align=None)
    revolve(axis=Axis((-1.5875, 0, 12.065), (1, 0, 0)), revolution_arc=359.64, mode=Mode.SUBTRACT)
    with BuildSketch(Plane(origin=(-1.5875, 0, -6.35), x_dir=(0, 0.9999950652018582, 0.0031415874858789195), z_dir=(0, 0.0031415874858789195, -0.9999950652018582))) as chamfer3_piece_2:
        Polygon((2.38125 + CHAMFER3_SIZE, 0), (2.38125, CHAMFER3_SIZE_2), (2.38125, 0), align=None)
    revolve(axis=Axis((-1.5875, 0, -6.35), (1, 0, 0)), revolution_arc=359.64, mode=Mode.SUBTRACT)
    with BuildSketch(Plane(origin=(39.6875, 0, -6.35), x_dir=(0, 0.9999950652018582, 0.0031415874858789195), z_dir=(0, 0.0031415874858789195, -0.9999950652018582))) as chamfer3_piece_3:
        Polygon((2.38125 + CHAMFER3_SIZE_2, 0), (2.38125, -CHAMFER3_SIZE), (2.38125, 0), align=None)
    revolve(axis=Axis((39.6875, 0, -6.35), (1, 0, 0)), revolution_arc=359.64, mode=Mode.SUBTRACT)
    with BuildSketch(Plane(origin=(39.6875, 0, 12.065), x_dir=(0, 0.9999950652018582, 0.0031415874858796654), z_dir=(0, 0.0031415874858796654, -0.9999950652018582))) as chamfer3_piece_4:
        Polygon((2.38125 + CHAMFER3_SIZE_2, 0), (2.38125, -CHAMFER3_SIZE), (2.38125, 0), align=None)
    revolve(axis=Axis((39.6875, 0, 12.065), (1, 0, 0)), revolution_arc=359.64, mode=Mode.SUBTRACT)

    # Sketch6 → Boss-Extrude7 (add)
    with BuildSketch(Plane(origin=(0, 0, 0), x_dir=(1, 0, 0), z_dir=(0, 1, 0))):
        with Locations((19.05, 14.0335)):
            Rectangle(SKETCH6_W, SKETCH6_H)
    extrude(amount=BOSS_EXTRUDE7_DEPTH)

    # Sketch11 → Boss-Extrude10 (add)
    with BuildSketch(Plane(origin=(22.225, 0, 0), x_dir=(0, 0, -1), z_dir=(1, 0, 0))):
        with BuildLine():
            Line((13.7795, 3.81), (13.7795, 3.302))
            ThreePointArc((13.7795, 3.302), (13.5255, 3.556), (13.7795, 3.81))
        make_face()
    extrude(amount=-BOSS_EXTRUDE10_DEPTH)

    # Sketch6<5> → Cut-Extrude2 (cut)
    with BuildSketch(Plane(origin=(0, 0, 0), x_dir=(1, 0, 0), z_dir=(0, 1, 0))):
        with Locations((19.05, -19.7485)):
            Rectangle(SKETCH6_5_W, SKETCH6_5_H)
    extrude(amount=-CUT_EXTRUDE2_DEPTH, mode=Mode.SUBTRACT)

    # Sketch9 → Cut-Extrude3 (cut)
    with BuildSketch(Plane.ZY.offset(-22.225)):
        with BuildLine():
            Line((19.4945, -3.81), (19.4945, -3.302))
            ThreePointArc((19.4945, -3.302), (19.2405, -3.556), (19.4945, -3.81))
        make_face()
    extrude(amount=CUT_EXTRUDE3_DEPTH, mode=Mode.SUBTRACT)

    # Chamfer4
    chamfer4_edges = [part.edges().sort_by_distance(p)[0] for p in [
        (15.875, 0, 19.7485),
        (19.05, 0, 19.4945),
        (22.225, 0, 19.7485),
    ]]
    chamfer(chamfer4_edges, length=CHAMFER4_SIZE)

    # Chamfer5
    chamfer5_edges = [part.edges().sort_by_distance(p)[0] for p in [
        (15.875, 0, -14.0335),
        (19.05, 0, -13.7795),
        (22.225, 0, -14.0335),
    ]]
    chamfer(chamfer5_edges, length=CHAMFER5_SIZE)

    # Sketch10 → Cut-Extrude4 (cut, through all)
    with BuildSketch(Plane.XZ.offset(7.6835)):
        with Locations(Location((19.05, -6.35, 0), (0, 0, 270))):
            Circle(SKETCH10_R)
    extrude(amount=-CUT_EXTRUDE4_DEPTH, mode=Mode.SUBTRACT)

    # Chamfer6
    chamfer6_edges = [part.edges().sort_by_distance(p)[0] for p in [
        (19.05, -7.6835, -4.699),
    ]]
    chamfer6_side = [part.faces().sort_by_distance(p)[0] for p in [
        (0.215935717, -7.6835, -6.35),
    ]]
    chamfer(chamfer6_edges, length=CHAMFER6_SIZE, length2=CHAMFER6_SIZE2, reference=chamfer6_side[0])

    # Fillet1
    # the kernel refuses this fillet: 6.35 mm, written as the material it adds along each edge
    with BuildSketch(Plane(origin=(0, -6.096, 0), x_dir=(0, 0, -1), z_dir=(1, 0, 0))) as fillet1_piece_1_section:
        with BuildLine():
            CenterArc((6.344917966, 6.35), FILLET1_R, 182.292442776, 87.707557224)
            Line((0, 6.096), (0, 0))
            Line((0, 0), (6.344917966, 0))
        make_face()
    fillet1_piece_1 = extrude(amount=38.1, mode=Mode.PRIVATE)
    fillet1_piece_1 = fillet1_piece_1 - Plane(origin=(19.05, -6.096, -6.35), x_dir=(0, 0, -1), z_dir=(0, -1, 0)) * Cylinder(1.651, 102, mode=Mode.PRIVATE)
    add(fillet1_piece_1)
    with BuildSketch(Plane(origin=(38.1, -6.096, -12.7), x_dir=(0, 0, 1), z_dir=(-1, 0, 0))) as fillet1_piece_2_section:
        with BuildLine():
            CenterArc((6.344917966, 6.35), FILLET1_R, 182.292442776, 87.707557224)
            Line((0, 6.096), (0, 0))
            Line((0, 0), (6.344917966, 0))
        make_face()
    fillet1_piece_2 = extrude(amount=38.1, mode=Mode.PRIVATE)
    fillet1_piece_2 = fillet1_piece_2 - Plane(origin=(19.05, -6.096, -6.35), x_dir=(0, 0, -1), z_dir=(0, -1, 0)) * Cylinder(1.651, 102, mode=Mode.PRIVATE)
    add(fillet1_piece_2)
    with BuildSketch(Plane(origin=(0, -6.096, 5.715), x_dir=(0, 1, 0), z_dir=(1, 0, 0)), Plane(origin=(38.1, -6.096, 18.415), x_dir=(0, 1, 0), z_dir=(-1, 0, 0))) as fillet1_piece_3:
        with BuildLine():
            CenterArc((6.35, 6.344917966), FILLET1_R, 180, 87.707557224)
            Line((0, 6.344917966), (0, 0))
            Line((0, 0), (6.096, 0))
        make_face()
    extrude(amount=38.1)


solid = part.part
